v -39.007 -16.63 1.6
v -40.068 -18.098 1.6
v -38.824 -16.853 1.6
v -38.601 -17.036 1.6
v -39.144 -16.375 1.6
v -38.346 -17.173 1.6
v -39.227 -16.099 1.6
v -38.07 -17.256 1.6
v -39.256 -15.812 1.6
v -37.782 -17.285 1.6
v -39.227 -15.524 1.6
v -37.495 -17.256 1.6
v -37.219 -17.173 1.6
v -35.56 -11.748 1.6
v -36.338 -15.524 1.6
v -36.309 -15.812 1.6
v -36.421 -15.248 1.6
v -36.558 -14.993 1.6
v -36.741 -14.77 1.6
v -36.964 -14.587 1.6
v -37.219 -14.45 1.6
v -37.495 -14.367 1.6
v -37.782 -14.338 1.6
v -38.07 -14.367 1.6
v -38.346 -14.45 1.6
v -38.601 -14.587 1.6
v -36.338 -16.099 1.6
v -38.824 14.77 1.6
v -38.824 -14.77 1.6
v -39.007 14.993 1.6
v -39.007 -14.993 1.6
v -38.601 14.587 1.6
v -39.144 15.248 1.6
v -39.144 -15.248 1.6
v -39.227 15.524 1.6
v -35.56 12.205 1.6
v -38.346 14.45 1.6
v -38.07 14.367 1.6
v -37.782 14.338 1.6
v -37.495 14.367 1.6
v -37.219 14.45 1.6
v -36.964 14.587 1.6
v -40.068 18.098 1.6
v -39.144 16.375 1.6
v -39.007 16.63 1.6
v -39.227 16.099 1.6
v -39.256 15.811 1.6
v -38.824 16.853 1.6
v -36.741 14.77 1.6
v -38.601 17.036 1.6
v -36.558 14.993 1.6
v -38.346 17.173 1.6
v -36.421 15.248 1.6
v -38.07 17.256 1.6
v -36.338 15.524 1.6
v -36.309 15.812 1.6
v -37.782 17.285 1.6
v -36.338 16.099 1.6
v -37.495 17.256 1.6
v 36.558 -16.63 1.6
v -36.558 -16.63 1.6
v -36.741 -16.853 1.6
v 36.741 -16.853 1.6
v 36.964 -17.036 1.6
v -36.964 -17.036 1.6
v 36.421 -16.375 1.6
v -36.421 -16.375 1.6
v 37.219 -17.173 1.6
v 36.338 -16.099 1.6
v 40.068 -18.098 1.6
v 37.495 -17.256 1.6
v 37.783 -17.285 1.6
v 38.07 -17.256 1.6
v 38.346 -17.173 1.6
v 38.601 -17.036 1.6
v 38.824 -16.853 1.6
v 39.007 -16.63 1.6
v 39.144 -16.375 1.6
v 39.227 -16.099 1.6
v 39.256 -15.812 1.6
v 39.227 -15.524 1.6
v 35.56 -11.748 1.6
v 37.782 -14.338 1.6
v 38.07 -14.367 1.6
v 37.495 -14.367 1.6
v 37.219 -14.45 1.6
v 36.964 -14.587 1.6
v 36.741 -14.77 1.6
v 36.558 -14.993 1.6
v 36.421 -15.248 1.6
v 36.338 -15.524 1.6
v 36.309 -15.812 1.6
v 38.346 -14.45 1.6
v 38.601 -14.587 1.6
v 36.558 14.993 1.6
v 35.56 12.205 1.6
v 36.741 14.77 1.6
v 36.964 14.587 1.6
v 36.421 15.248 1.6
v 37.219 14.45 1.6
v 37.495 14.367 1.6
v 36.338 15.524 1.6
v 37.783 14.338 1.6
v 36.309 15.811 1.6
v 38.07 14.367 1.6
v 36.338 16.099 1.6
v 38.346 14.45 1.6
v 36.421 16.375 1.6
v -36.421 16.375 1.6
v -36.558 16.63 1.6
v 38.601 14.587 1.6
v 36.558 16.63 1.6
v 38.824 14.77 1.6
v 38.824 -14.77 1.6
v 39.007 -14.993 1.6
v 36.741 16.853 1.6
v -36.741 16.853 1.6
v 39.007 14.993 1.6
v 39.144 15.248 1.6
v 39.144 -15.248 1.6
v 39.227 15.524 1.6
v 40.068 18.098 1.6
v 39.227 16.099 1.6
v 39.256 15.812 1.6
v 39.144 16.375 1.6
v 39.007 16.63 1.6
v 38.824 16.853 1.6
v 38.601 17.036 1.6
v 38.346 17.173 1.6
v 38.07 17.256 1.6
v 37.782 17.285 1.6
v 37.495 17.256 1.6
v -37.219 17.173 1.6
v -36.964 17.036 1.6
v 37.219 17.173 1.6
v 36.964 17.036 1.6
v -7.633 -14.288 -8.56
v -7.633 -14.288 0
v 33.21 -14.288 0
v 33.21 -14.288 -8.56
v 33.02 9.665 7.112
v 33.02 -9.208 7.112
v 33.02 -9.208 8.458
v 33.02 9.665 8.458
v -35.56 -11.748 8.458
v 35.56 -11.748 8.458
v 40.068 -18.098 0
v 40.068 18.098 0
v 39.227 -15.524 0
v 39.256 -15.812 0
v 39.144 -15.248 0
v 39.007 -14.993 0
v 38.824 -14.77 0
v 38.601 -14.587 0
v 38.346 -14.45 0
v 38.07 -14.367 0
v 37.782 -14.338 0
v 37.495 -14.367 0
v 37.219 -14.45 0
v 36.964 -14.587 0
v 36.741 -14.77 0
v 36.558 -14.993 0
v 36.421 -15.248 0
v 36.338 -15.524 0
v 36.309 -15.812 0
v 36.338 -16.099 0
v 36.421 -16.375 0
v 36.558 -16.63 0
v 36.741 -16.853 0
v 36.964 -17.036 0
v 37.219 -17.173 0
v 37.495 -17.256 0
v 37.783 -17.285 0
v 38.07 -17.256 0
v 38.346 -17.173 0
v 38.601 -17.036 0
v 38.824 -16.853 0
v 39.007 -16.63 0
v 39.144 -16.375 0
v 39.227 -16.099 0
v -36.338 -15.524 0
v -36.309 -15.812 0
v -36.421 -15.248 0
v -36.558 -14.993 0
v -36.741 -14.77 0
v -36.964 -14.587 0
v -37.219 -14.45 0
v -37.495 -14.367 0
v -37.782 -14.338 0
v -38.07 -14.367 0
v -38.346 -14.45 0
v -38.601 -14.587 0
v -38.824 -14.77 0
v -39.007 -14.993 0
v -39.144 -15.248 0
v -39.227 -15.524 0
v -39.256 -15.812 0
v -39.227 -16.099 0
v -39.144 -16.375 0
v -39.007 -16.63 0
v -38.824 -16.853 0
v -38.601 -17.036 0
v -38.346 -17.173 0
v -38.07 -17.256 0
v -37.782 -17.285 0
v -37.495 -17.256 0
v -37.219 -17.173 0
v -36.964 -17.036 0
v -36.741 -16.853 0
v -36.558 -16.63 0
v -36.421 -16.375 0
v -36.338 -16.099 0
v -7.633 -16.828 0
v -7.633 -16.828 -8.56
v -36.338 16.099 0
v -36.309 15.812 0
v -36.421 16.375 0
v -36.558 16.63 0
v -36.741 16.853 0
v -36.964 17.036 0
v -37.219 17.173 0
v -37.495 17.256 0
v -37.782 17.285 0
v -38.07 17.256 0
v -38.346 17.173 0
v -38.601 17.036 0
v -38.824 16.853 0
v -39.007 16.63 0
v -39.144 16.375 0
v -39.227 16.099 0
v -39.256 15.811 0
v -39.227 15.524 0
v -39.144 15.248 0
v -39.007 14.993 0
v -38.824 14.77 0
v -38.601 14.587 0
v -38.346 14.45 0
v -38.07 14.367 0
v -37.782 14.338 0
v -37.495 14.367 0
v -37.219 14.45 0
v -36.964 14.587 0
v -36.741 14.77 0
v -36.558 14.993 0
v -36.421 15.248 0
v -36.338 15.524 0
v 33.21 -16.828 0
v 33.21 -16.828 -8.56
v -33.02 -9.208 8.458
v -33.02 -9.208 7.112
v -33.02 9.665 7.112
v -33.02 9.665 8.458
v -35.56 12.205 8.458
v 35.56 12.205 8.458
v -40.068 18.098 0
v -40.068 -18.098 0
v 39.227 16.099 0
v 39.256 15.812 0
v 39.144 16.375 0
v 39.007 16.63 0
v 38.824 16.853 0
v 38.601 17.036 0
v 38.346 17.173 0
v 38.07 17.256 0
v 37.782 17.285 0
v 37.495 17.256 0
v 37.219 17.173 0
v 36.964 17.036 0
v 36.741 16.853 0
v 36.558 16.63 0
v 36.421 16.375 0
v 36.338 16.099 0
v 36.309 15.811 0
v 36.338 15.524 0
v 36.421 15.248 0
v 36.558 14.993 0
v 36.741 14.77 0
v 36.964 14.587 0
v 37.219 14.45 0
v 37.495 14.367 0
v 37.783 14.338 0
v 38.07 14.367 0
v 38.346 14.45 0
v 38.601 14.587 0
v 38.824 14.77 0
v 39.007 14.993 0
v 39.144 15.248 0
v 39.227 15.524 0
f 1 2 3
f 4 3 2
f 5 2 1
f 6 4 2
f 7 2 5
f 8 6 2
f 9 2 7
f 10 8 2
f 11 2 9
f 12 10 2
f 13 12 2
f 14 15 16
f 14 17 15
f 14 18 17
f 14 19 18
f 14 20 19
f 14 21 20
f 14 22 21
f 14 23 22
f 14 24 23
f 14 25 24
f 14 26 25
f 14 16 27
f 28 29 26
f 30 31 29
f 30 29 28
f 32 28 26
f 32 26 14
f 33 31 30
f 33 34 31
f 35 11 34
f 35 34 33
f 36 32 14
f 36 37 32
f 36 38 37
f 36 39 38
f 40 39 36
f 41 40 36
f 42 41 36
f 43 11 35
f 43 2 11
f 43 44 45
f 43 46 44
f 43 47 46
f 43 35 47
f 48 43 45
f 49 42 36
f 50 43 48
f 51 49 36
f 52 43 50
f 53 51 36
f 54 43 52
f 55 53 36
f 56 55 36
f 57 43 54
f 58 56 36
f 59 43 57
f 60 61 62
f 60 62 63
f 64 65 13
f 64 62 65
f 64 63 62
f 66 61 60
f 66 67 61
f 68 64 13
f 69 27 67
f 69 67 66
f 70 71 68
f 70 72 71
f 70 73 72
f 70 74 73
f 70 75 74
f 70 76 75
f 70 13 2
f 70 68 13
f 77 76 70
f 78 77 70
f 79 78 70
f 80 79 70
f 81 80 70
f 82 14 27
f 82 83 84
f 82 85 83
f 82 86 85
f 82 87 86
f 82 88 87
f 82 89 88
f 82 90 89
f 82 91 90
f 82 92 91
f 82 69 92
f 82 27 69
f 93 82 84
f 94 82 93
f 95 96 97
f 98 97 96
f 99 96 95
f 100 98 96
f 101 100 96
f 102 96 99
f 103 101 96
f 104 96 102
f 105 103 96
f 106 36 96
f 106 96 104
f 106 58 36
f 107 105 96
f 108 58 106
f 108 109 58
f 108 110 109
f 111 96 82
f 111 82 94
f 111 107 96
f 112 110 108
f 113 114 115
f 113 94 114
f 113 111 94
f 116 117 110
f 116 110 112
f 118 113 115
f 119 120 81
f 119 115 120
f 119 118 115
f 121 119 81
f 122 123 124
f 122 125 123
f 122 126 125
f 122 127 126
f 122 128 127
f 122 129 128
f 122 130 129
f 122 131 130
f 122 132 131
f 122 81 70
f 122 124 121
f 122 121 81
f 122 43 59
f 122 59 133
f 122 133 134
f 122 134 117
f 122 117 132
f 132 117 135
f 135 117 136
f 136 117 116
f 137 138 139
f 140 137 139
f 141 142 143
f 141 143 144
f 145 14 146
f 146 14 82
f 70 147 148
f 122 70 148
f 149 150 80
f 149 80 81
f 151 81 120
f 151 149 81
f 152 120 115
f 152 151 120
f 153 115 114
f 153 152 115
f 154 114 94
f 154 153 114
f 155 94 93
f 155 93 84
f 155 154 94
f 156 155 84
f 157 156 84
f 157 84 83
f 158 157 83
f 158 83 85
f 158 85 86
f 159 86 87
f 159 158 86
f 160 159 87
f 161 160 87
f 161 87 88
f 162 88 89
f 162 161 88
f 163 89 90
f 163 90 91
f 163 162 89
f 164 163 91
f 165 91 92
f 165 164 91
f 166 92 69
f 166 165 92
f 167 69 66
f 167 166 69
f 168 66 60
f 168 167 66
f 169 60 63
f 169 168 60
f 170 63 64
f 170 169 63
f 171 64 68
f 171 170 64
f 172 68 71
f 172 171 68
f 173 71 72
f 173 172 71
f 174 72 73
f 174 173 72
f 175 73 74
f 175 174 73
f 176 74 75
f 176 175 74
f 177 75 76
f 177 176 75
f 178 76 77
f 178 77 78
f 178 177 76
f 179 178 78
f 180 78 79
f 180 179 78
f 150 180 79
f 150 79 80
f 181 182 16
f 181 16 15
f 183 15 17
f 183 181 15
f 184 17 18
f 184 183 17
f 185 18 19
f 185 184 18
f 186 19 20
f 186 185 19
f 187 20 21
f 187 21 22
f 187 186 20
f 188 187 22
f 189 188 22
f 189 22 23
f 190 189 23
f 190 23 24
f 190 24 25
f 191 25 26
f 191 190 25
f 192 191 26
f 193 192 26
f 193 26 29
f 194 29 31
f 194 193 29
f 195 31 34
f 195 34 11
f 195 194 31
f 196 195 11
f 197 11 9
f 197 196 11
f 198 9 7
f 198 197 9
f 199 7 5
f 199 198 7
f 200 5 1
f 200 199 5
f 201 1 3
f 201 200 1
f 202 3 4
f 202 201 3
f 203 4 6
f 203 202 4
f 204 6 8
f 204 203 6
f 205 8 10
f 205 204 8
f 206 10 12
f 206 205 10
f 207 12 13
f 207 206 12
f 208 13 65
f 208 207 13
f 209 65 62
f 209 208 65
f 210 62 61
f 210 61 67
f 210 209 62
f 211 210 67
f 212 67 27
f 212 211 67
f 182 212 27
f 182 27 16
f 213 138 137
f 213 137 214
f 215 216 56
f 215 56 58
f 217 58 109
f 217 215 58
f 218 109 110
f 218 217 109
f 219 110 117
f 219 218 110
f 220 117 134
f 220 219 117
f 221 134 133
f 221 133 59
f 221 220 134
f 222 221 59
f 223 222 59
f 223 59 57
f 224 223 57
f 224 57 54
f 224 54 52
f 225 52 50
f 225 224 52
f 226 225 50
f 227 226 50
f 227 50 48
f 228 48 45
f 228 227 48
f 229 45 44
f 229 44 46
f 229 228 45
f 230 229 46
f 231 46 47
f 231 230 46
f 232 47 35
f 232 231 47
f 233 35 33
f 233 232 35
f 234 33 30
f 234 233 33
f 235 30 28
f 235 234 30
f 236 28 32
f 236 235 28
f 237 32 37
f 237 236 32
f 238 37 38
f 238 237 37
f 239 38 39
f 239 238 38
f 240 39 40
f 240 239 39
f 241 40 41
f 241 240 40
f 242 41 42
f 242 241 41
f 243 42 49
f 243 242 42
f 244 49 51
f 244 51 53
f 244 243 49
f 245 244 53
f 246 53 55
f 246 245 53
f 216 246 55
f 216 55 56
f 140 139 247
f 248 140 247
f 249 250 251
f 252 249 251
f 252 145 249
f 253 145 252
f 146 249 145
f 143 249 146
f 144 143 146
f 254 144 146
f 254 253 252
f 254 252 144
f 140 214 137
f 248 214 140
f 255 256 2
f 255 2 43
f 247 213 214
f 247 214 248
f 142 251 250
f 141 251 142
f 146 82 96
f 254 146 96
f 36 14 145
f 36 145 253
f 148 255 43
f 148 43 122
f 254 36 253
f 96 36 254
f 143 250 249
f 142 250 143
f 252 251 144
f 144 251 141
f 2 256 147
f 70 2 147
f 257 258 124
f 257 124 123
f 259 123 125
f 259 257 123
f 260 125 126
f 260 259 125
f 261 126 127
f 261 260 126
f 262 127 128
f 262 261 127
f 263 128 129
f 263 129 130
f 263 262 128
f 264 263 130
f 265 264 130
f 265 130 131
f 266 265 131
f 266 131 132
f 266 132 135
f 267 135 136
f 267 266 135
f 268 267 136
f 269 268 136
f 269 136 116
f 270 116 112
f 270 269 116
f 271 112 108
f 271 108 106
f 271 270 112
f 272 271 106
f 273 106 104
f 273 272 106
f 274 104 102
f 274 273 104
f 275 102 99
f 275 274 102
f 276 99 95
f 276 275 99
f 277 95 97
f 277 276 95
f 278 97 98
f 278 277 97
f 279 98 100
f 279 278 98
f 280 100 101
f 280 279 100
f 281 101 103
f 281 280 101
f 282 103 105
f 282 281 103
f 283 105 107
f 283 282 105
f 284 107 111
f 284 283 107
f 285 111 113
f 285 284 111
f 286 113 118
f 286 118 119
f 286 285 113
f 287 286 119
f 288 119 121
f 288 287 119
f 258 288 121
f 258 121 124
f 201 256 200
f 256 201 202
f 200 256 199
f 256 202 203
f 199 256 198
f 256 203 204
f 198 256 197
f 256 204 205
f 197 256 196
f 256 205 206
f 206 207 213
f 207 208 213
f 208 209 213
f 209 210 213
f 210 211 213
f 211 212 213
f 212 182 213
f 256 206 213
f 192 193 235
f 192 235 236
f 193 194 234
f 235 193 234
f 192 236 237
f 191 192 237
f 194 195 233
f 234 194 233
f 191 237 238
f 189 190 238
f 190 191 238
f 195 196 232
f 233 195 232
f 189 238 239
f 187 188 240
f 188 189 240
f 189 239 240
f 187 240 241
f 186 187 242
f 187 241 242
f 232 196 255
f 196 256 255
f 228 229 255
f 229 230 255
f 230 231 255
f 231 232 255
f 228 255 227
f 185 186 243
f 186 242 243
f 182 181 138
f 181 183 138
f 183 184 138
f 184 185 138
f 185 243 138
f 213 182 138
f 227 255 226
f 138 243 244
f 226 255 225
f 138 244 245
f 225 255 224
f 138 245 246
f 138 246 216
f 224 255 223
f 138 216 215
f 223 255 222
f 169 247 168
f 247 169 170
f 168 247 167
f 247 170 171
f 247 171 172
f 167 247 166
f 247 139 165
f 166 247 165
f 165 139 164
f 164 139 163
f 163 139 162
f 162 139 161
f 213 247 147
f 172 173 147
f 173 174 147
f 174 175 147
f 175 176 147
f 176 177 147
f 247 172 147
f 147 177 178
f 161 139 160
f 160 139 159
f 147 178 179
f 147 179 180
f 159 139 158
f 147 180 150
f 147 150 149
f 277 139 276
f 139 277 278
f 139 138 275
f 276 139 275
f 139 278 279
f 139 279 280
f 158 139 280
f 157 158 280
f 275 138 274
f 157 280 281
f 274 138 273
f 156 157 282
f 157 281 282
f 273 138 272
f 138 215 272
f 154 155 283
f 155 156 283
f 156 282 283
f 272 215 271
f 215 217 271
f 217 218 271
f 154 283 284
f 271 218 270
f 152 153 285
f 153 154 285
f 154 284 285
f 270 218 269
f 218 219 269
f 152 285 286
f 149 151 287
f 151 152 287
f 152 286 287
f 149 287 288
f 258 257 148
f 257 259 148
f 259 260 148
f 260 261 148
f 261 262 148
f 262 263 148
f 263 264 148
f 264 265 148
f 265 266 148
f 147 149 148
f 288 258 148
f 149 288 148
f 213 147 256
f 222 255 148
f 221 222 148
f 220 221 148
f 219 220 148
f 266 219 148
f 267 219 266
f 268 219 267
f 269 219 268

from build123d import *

# Parameters (mm, degrees)
F0_W     = 80.137
F0_H     = 36.195
F0_R     = 1.4732
F1_DEPTH = 1.6002
F2_W     = 71.12
F2_H     = 23.9522
F3_DEPTH = 6.858
F4_T     = -2.54
F5_DEPTH = 4.572
F6_W     = 40.8432
F6_H     = 2.54
F7_DEPTH = 8.5598


with BuildPart() as f1:
    # F0 (on Top) → F1 (new body)
    with BuildSketch(Plane.XY):
        Rectangle(F0_W, F0_H)
        with Locations((-37.7825, -15.8115)):
            Circle(F0_R, mode=Mode.SUBTRACT)
        with Locations((37.7825, -15.8115)):
            Circle(F0_R, mode=Mode.SUBTRACT)
        with Locations((-37.7825, 15.8115)):
            Circle(F0_R, mode=Mode.SUBTRACT)
        with Locations((37.7825, 15.8115)):
            Circle(F0_R, mode=Mode.SUBTRACT)
    extrude(amount=F1_DEPTH)

    # F2 (on face) → F3 (join)
    with BuildSketch(Plane.XY.offset(1.6002)):
        with Locations((0, 0.2286)):
            Rectangle(F2_W, F2_H)
    extrude(amount=F3_DEPTH)

    # F4
    f4_openings = [f1.faces().sort_by_distance(p)[0] for p in [
        (0, 0.2286, 8.4582),
    ]]
    offset(amount=F4_T, openings=f4_openings)

    # F5 (add): a face of the model
    f5_faces = [f1.faces().sort_by_distance(p)[0] for p in [
        (0, 0.2286, 2.54),
    ]]
    extrude(f5_faces, amount=F5_DEPTH)

    # F6 (on face) → F7 (join)
    with BuildSketch(Plane(origin=(0, 0, 0), x_dir=(1, 0, 0), z_dir=(0, 0, -1))):
        with Locations((12.7889, 15.5575)):
            Rectangle(F6_W, F6_H)
    extrude(amount=F7_DEPTH)


solid = f1.part
